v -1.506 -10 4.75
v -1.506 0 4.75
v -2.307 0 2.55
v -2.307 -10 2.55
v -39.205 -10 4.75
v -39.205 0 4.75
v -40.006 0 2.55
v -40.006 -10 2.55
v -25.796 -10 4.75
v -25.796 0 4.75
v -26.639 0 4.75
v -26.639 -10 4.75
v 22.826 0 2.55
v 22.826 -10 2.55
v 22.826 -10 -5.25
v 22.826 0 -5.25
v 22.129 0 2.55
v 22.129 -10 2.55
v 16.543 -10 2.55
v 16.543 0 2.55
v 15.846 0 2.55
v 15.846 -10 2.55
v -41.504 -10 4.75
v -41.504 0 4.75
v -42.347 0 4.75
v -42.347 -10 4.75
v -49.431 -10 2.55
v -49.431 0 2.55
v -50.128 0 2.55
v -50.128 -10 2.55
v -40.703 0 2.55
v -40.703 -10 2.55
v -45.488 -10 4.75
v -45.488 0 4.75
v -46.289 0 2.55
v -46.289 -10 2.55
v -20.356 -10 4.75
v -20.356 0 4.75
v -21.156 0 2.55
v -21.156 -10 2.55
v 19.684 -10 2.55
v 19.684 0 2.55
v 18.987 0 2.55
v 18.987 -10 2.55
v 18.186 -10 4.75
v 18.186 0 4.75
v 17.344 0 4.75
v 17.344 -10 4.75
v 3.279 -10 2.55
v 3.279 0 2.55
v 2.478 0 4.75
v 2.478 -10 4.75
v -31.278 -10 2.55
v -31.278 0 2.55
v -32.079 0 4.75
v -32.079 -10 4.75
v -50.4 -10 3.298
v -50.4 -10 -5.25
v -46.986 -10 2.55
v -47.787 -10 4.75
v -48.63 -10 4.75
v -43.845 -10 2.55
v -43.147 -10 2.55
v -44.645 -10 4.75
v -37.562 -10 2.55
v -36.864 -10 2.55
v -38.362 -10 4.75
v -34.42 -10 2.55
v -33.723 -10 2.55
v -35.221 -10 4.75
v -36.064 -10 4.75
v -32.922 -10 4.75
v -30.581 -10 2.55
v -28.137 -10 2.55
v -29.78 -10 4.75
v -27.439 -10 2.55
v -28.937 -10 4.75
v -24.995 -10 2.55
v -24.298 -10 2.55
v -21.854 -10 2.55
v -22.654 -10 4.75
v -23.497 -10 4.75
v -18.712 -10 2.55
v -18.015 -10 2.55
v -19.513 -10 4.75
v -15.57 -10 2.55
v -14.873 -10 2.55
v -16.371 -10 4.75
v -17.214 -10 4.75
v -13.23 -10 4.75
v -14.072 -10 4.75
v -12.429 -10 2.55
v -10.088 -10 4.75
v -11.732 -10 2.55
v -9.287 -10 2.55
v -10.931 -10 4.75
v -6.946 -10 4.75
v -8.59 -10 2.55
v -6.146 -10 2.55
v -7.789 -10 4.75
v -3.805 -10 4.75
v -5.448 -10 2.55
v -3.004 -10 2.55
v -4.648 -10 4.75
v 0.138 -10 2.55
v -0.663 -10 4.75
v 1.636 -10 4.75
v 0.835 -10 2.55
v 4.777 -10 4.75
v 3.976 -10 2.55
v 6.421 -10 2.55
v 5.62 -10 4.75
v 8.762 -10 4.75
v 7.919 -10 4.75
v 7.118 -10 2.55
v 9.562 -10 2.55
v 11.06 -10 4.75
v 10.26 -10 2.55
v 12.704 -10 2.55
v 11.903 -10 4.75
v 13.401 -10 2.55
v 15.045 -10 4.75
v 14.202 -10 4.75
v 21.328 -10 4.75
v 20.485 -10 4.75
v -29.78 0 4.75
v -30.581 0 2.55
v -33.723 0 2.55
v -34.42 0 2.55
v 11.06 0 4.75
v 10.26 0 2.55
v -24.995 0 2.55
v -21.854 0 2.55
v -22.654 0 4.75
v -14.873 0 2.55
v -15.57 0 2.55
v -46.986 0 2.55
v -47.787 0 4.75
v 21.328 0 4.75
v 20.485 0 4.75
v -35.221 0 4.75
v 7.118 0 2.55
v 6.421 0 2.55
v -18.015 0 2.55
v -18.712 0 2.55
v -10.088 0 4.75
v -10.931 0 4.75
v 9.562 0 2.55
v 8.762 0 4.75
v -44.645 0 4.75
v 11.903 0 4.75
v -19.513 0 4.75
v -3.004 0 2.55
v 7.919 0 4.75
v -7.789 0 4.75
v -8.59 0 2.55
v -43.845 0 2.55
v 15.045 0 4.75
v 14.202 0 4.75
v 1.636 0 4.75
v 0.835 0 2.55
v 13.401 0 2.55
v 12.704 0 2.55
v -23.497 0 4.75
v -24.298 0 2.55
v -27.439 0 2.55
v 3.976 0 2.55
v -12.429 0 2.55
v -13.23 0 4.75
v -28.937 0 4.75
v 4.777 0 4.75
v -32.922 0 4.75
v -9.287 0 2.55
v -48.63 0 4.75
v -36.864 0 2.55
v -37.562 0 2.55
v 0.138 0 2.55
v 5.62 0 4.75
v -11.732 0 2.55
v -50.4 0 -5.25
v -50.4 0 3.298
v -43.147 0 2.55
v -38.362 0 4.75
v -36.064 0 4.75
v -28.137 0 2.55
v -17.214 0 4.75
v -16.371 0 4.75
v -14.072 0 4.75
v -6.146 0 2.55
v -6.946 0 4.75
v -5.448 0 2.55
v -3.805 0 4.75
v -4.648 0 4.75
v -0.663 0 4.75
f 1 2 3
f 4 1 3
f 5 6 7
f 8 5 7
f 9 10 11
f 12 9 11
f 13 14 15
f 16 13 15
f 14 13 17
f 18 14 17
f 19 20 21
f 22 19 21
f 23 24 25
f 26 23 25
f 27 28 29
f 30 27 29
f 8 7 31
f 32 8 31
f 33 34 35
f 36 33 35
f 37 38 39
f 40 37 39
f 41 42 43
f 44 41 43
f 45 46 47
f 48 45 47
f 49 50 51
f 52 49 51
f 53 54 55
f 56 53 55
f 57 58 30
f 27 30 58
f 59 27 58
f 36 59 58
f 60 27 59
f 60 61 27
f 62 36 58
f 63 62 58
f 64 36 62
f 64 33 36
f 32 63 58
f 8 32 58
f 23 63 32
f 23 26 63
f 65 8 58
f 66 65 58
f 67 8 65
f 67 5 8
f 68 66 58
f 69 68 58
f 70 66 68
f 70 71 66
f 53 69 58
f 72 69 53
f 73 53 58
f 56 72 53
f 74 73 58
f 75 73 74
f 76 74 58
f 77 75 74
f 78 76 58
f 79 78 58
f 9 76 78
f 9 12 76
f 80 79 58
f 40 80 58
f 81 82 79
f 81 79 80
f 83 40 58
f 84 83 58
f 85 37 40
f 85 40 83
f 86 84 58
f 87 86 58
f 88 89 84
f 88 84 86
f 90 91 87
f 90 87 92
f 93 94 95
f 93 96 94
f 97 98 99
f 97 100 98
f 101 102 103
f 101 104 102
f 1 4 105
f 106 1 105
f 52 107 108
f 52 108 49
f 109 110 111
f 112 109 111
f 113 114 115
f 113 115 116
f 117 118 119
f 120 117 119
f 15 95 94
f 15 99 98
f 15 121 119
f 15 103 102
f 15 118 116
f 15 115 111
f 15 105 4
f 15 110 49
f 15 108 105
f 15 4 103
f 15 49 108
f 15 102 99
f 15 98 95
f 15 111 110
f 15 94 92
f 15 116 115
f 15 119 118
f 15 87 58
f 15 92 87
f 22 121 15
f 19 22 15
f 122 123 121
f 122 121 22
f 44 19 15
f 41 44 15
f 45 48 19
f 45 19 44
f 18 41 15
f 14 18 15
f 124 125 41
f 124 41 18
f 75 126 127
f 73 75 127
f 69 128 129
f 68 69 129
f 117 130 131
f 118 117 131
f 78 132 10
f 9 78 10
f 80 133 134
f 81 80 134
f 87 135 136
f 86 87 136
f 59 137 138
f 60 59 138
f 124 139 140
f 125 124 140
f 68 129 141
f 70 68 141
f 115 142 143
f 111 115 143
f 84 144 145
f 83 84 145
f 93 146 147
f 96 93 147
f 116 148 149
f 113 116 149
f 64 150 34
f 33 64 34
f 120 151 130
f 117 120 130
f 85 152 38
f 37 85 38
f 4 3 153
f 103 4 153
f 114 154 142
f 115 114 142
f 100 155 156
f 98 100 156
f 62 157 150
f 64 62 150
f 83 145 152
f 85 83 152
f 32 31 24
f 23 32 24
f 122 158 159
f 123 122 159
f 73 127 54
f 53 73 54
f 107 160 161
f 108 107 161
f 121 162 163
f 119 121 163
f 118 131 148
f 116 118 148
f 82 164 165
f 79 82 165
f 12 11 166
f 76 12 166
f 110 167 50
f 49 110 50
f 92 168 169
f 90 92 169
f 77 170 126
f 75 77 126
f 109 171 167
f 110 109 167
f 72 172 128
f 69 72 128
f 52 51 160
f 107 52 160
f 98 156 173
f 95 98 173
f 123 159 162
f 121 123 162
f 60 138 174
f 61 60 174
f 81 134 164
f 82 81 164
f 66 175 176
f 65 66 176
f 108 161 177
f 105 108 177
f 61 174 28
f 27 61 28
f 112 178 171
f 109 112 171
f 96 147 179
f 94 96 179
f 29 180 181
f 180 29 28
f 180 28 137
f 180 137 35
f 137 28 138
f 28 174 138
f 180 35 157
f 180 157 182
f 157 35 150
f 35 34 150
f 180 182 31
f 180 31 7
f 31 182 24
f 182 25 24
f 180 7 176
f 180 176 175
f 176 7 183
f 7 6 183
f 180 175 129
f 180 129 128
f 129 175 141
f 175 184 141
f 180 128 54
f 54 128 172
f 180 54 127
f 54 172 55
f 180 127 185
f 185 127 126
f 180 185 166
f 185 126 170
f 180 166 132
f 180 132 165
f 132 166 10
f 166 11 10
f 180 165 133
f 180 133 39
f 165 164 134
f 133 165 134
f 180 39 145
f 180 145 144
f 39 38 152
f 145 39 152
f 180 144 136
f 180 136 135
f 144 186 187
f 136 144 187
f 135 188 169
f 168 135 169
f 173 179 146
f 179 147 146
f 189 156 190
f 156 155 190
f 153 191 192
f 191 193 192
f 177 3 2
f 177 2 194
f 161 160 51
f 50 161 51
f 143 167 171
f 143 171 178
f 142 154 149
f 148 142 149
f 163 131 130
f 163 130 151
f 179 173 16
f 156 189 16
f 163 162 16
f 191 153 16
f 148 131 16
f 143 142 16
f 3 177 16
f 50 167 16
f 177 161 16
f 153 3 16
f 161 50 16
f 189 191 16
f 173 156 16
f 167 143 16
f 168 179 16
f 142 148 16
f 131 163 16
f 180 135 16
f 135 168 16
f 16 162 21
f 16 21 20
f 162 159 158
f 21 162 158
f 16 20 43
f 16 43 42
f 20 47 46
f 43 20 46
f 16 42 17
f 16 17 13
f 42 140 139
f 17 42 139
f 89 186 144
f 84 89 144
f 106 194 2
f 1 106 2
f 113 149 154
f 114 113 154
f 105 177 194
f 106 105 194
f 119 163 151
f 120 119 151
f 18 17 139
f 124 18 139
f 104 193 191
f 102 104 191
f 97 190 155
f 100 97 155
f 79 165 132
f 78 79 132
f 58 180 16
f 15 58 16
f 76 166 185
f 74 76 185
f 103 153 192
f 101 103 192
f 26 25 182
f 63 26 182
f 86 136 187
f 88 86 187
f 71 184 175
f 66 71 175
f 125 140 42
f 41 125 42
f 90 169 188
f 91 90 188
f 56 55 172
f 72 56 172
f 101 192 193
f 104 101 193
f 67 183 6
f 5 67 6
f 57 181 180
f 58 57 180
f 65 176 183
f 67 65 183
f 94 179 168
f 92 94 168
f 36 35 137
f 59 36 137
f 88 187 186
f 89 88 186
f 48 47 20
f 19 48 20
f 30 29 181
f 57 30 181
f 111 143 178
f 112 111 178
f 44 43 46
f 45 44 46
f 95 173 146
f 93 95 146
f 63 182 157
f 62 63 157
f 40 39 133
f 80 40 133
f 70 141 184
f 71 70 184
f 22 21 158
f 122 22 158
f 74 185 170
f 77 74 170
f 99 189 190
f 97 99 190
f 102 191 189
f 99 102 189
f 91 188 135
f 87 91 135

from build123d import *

# Parameters (mm, degrees)
F1_DEPTH = 25
F3_DEPTH = 26
F5_DEPTH = 25
F6_DEPTH = 15


with BuildPart() as f1:
    # F0 (on Front) → F1 (new body)
    with BuildSketch(Plane.XZ):
        Polygon((245.77381, 2.55), (245.181582, 2.55), (244.380847, 4.75), (243.537993, 4.75), (242.737258, 2.55), (242.039992, 2.55), (241.239257, 4.75), (240.396403, 4.75), (239.595668, 2.55), (238.898402, 2.55), (238.097667, 4.75), (237.254813, 4.75), (236.454078, 2.55), (235.756812, 2.55), (234.956077, 4.75), (234.113223, 4.75), (233.312488, 2.55), (232.615222, 2.55), (231.814487, 4.75), (230.971633, 4.75), (230.170898, 2.55), (229.473632, 2.55), (228.672897, 4.75), (227.830043, 4.75), (227.029308, 2.55), (226.332042, 2.55), (225.531307, 4.75), (224.688453, 4.75), (223.887718, 2.55), (223.190452, 2.55), (222.389717, 4.75), (221.546863, 4.75), (220.746128, 2.55), (220.048862, 2.55), (219.248127, 4.75), (218.405273, 4.75), (217.604538, 2.55), (216.907272, 2.55), (216.106537, 4.75), (215.263683, 4.75), (214.462948, 2.55), (213.765682, 2.55), (212.964947, 4.75), (212.122093, 4.75), (211.321358, 2.55), (210.624092, 2.55), (209.823357, 4.75), (208.980503, 4.75), (208.179768, 2.55), (207.482502, 2.55), (206.681767, 4.75), (205.838913, 4.75), (205.038178, 2.55), (204.340912, 2.55), (203.540177, 4.75), (202.697323, 4.75), (201.896588, 2.55), (201.199322, 2.55), (200.398587, 4.75), (199.555733, 4.75), (198.754998, 2.55), (198.057732, 2.55), (197.256997, 4.75), (196.414143, 4.75), (195.613408, 2.55), (194.916142, 2.55), (194.115407, 4.75), (193.272553, 4.75), (192.471818, 2.55), (191.774552, 2.55), (190.973817, 4.75), (190.130963, 4.75), (189.330228, 2.55), (188.632962, 2.55), (187.832227, 4.75), (186.989373, 4.75), (186.188638, 2.55), (185.491372, 2.55), (184.690637, 4.75), (183.847783, 4.75), (183.047048, 2.55), (182.349782, 2.55), (181.549047, 4.75), (180.706193, 4.75), (179.905458, 2.55), (179.208192, 2.55), (178.407457, 4.75), (177.564603, 4.75), (176.763868, 2.55), (176.066602, 2.55), (175.265867, 4.75), (174.423013, 4.75), (173.622278, 2.55), (172.925012, 2.55), (172.124277, 4.75), (171.281423, 4.75), (170.480688, 2.55), (169.783422, 2.55), (168.982687, 4.75), (168.139833, 4.75), (167.339098, 2.55), (166.641832, 2.55), (165.841097, 4.75), (164.998243, 4.75), (164.197508, 2.55), (163.500242, 2.55), (162.699507, 4.75), (161.856653, 4.75), (161.055918, 2.55), (160.358652, 2.55), (159.557917, 4.75), (158.715063, 4.75), (157.914328, 2.55), (157.217062, 2.55), (156.416327, 4.75), (155.573473, 4.75), (154.772738, 2.55), (154.075472, 2.55), (153.274737, 4.75), (152.431883, 4.75), (151.631148, 2.55), (150.933882, 2.55), (150.133147, 4.75), (149.290293, 4.75), (148.489558, 2.55), (147.792292, 2.55), (146.991557, 4.75), (146.148703, 4.75), (145.347968, 2.55), (144.650702, 2.55), (143.849967, 4.75), (143.007113, 4.75), (142.206378, 2.55), (141.509112, 2.55), (140.708377, 4.75), (139.865523, 4.75), (139.064788, 2.55), (138.367522, 2.55), (137.566787, 4.75), (136.723933, 4.75), (135.923198, 2.55), (135.225932, 2.55), (134.425197, 4.75), (133.582343, 4.75), (132.781608, 2.55), (132.084342, 2.55), (131.283607, 4.75), (130.440753, 4.75), (129.640018, 2.55), (128.942752, 2.55), (128.142017, 4.75), (127.299163, 4.75), (126.498428, 2.55), (125.801162, 2.55), (125.000427, 4.75), (124.157573, 4.75), (123.356838, 2.55), (122.659572, 2.55), (121.858837, 4.75), (121.015983, 4.75), (120.215248, 2.55), (119.517982, 2.55), (118.717247, 4.75), (117.874393, 4.75), (117.073658, 2.55), (116.376392, 2.55), (115.575657, 4.75), (114.732803, 4.75), (113.932068, 2.55), (113.234802, 2.55), (112.434067, 4.75), (111.591213, 4.75), (110.790478, 2.55), (110.093212, 2.55), (109.292477, 4.75), (108.449623, 4.75), (107.648888, 2.55), (106.951622, 2.55), (106.150887, 4.75), (105.308033, 4.75), (104.507298, 2.55), (103.810032, 2.55), (103.009297, 4.75), (102.166443, 4.75), (101.365708, 2.55), (100.668442, 2.55), (99.867707, 4.75), (99.024853, 4.75), (98.224118, 2.55), (97.526852, 2.55), (96.726117, 4.75), (95.883263, 4.75), (95.082528, 2.55), (94.385262, 2.55), (93.584527, 4.75), (92.741673, 4.75), (91.940938, 2.55), (91.243672, 2.55), (90.442937, 4.75), (89.600083, 4.75), (88.799348, 2.55), (88.102082, 2.55), (87.301347, 4.75), (86.458493, 4.75), (85.657758, 2.55), (84.960492, 2.55), (84.159757, 4.75), (83.316903, 4.75), (82.516168, 2.55), (81.818902, 2.55), (81.018167, 4.75), (80.175313, 4.75), (79.374578, 2.55), (78.677312, 2.55), (77.876577, 4.75), (77.033723, 4.75), (76.232988, 2.55), (75.535722, 2.55), (74.734987, 4.75), (73.892133, 4.75), (73.091398, 2.55), (72.394132, 2.55), (71.593397, 4.75), (70.750543, 4.75), (69.949808, 2.55), (69.252542, 2.55), (68.451807, 4.75), (67.608953, 4.75), (66.808218, 2.55), (66.110952, 2.55), (65.310217, 4.75), (64.467363, 4.75), (63.666628, 2.55), (62.969362, 2.55), (62.168627, 4.75), (61.325773, 4.75), (60.525038, 2.55), (59.827772, 2.55), (59.027037, 4.75), (58.184183, 4.75), (57.383448, 2.55), (56.686182, 2.55), (55.885447, 4.75), (55.042593, 4.75), (54.241858, 2.55), (53.544592, 2.55), (52.743857, 4.75), (51.901003, 4.75), (51.100268, 2.55), (50.403002, 2.55), (49.602267, 4.75), (48.759413, 4.75), (47.958678, 2.55), (47.261412, 2.55), (46.460677, 4.75), (45.617823, 4.75), (44.817088, 2.55), (44.7243452072, 2.55), (44.7243452072, -5.25), (245.77381, -5.25), align=None)
        Polygon((-50.4001379013, -5.25), (44.7243452072, -5.25), (44.7243452072, 2.55), (44.119822, 2.55), (43.319087, 4.75), (42.476233, 4.75), (41.675498, 2.55), (40.978232, 2.55), (40.177497, 4.75), (39.334643, 4.75), (38.533908, 2.55), (37.836642, 2.55), (37.035907, 4.75), (36.193053, 4.75), (35.392318, 2.55), (34.695052, 2.55), (33.894317, 4.75), (33.051463, 4.75), (32.250728, 2.55), (31.553462, 2.55), (30.752727, 4.75), (29.909873, 4.75), (29.109138, 2.55), (28.411872, 2.55), (27.611137, 4.75), (26.768283, 4.75), (25.967548, 2.55), (25.270282, 2.55), (24.469547, 4.75), (23.626693, 4.75), (22.825958, 2.55), (22.128692, 2.55), (21.327957, 4.75), (20.485103, 4.75), (19.684368, 2.55), (18.987102, 2.55), (18.186367, 4.75), (17.343513, 4.75), (16.542778, 2.55), (15.845512, 2.55), (15.044777, 4.75), (14.201923, 4.75), (13.401188, 2.55), (12.703922, 2.55), (11.903187, 4.75), (11.060333, 4.75), (10.259598, 2.55), (9.562332, 2.55), (8.761597, 4.75), (7.918743, 4.75), (7.118008, 2.55), (6.420742, 2.55), (5.620007, 4.75), (4.777153, 4.75), (3.976418, 2.55), (3.279152, 2.55), (2.478417, 4.75), (1.635563, 4.75), (0.834828, 2.55), (0.137562, 2.55), (-0.663173, 4.75), (-1.506027, 4.75), (-2.306762, 2.55), (-3.004028, 2.55), (-3.804763, 4.75), (-4.647617, 4.75), (-5.448352, 2.55), (-6.145618, 2.55), (-6.946353, 4.75), (-7.789207, 4.75), (-8.589942, 2.55), (-9.287208, 2.55), (-10.087943, 4.75), (-10.930797, 4.75), (-11.731532, 2.55), (-12.428798, 2.55), (-13.229533, 4.75), (-14.072387, 4.75), (-14.873122, 2.55), (-15.570388, 2.55), (-16.371123, 4.75), (-17.213977, 4.75), (-18.014712, 2.55), (-18.711978, 2.55), (-19.512713, 4.75), (-20.355567, 4.75), (-21.156302, 2.55), (-21.853568, 2.55), (-22.654303, 4.75), (-23.497157, 4.75), (-24.297892, 2.55), (-24.995158, 2.55), (-25.795893, 4.75), (-26.638747, 4.75), (-27.439482, 2.55), (-28.136748, 2.55), (-28.937483, 4.75), (-29.780337, 4.75), (-30.581072, 2.55), (-31.278338, 2.55), (-32.079073, 4.75), (-32.921927, 4.75), (-33.722662, 2.55), (-34.419928, 2.55), (-35.220663, 4.75), (-36.063517, 4.75), (-36.864252, 2.55), (-37.561518, 2.55), (-38.362253, 4.75), (-39.205107, 4.75), (-40.005842, 2.55), (-40.703108, 2.55), (-41.503843, 4.75), (-42.346697, 4.75), (-43.147432, 2.55), (-43.844698, 2.55), (-44.645433, 4.75), (-45.488287, 4.75), (-46.289022, 2.55), (-46.986288, 2.55), (-47.787023, 4.75), (-48.629877, 4.75), (-49.430612, 2.55), (-50.127878, 2.55), (-50.4001379013, 3.2980274783), align=None)
    extrude(amount=F1_DEPTH)

    # F2 (on face) → F3 (cut)
    with BuildSketch(Plane.XZ.offset(25)):
        Polygon((111.591213, 4.75), (110.790478, 2.55), (110.790478, -5.25), (245.77381, -5.25), (245.77381, 2.55), (245.181582, 2.55), (244.380847, 4.75), (243.537993, 4.75), (242.737258, 2.55), (242.039992, 2.55), (241.239257, 4.75), (240.396403, 4.75), (239.595668, 2.55), (238.898402, 2.55), (238.097667, 4.75), (237.254813, 4.75), (236.454078, 2.55), (235.756812, 2.55), (234.956077, 4.75), (234.113223, 4.75), (233.312488, 2.55), (232.615222, 2.55), (231.814487, 4.75), (230.971633, 4.75), (230.170898, 2.55), (229.473632, 2.55), (228.672897, 4.75), (227.830043, 4.75), (227.029308, 2.55), (226.332042, 2.55), (225.531307, 4.75), (224.688453, 4.75), (223.887718, 2.55), (223.190452, 2.55), (222.389717, 4.75), (221.546863, 4.75), (220.746128, 2.55), (220.048862, 2.55), (219.248127, 4.75), (218.405273, 4.75), (217.604538, 2.55), (216.907272, 2.55), (216.106537, 4.75), (215.263683, 4.75), (214.462948, 2.55), (213.765682, 2.55), (212.964947, 4.75), (212.122093, 4.75), (211.321358, 2.55), (210.624092, 2.55), (209.823357, 4.75), (208.980503, 4.75), (208.179768, 2.55), (207.482502, 2.55), (206.681767, 4.75), (205.838913, 4.75), (205.038178, 2.55), (204.340912, 2.55), (203.540177, 4.75), (202.697323, 4.75), (201.896588, 2.55), (201.199322, 2.55), (200.398587, 4.75), (199.555733, 4.75), (198.754998, 2.55), (198.057732, 2.55), (197.256997, 4.75), (196.414143, 4.75), (195.613408, 2.55), (194.916142, 2.55), (194.115407, 4.75), (193.272553, 4.75), (192.471818, 2.55), (191.774552, 2.55), (190.973817, 4.75), (190.130963, 4.75), (189.330228, 2.55), (188.632962, 2.55), (187.832227, 4.75), (186.989373, 4.75), (186.188638, 2.55), (185.491372, 2.55), (184.690637, 4.75), (183.847783, 4.75), (183.047048, 2.55), (182.349782, 2.55), (181.549047, 4.75), (180.706193, 4.75), (179.905458, 2.55), (179.208192, 2.55), (178.407457, 4.75), (177.564603, 4.75), (176.763868, 2.55), (176.066602, 2.55), (175.265867, 4.75), (174.423013, 4.75), (173.622278, 2.55), (172.925012, 2.55), (172.124277, 4.75), (171.281423, 4.75), (170.480688, 2.55), (169.783422, 2.55), (168.982687, 4.75), (168.139833, 4.75), (167.339098, 2.55), (166.641832, 2.55), (165.841097, 4.75), (164.998243, 4.75), (164.197508, 2.55), (163.500242, 2.55), (162.699507, 4.75), (161.856653, 4.75), (161.055918, 2.55), (160.358652, 2.55), (159.557917, 4.75), (158.715063, 4.75), (157.914328, 2.55), (157.217062, 2.55), (156.416327, 4.75), (155.573473, 4.75), (154.772738, 2.55), (154.075472, 2.55), (153.274737, 4.75), (152.431883, 4.75), (151.631148, 2.55), (150.933882, 2.55), (150.133147, 4.75), (149.290293, 4.75), (148.489558, 2.55), (147.792292, 2.55), (146.991557, 4.75), (146.148703, 4.75), (145.347968, 2.55), (144.650702, 2.55), (143.849967, 4.75), (143.007113, 4.75), (142.206378, 2.55), (141.509112, 2.55), (140.708377, 4.75), (139.865523, 4.75), (139.064788, 2.55), (138.367522, 2.55), (137.566787, 4.75), (136.723933, 4.75), (135.923198, 2.55), (135.225932, 2.55), (134.425197, 4.75), (133.582343, 4.75), (132.781608, 2.55), (132.084342, 2.55), (131.283607, 4.75), (130.440753, 4.75), (129.640018, 2.55), (128.942752, 2.55), (128.142017, 4.75), (127.299163, 4.75), (126.498428, 2.55), (125.801162, 2.55), (125.000427, 4.75), (124.157573, 4.75), (123.356838, 2.55), (122.659572, 2.55), (121.858837, 4.75), (121.015983, 4.75), (120.215248, 2.55), (119.517982, 2.55), (118.717247, 4.75), (117.874393, 4.75), (117.073658, 2.55), (116.376392, 2.55), (115.575657, 4.75), (114.732803, 4.75), (113.932068, 2.55), (113.234802, 2.55), (112.434067, 4.75), align=None)
    extrude(amount=-F3_DEPTH, mode=Mode.SUBTRACT)

    # F4 (on face) → F5 (cut)
    with BuildSketch(Plane.XZ.offset(25)):
        Polygon((23.626693, 4.75), (22.825958, 2.55), (22.825958, -5.25), (110.790478, -5.25), (110.790478, 2.55), (110.093212, 2.55), (109.292477, 4.75), (108.449623, 4.75), (107.648888, 2.55), (106.951622, 2.55), (106.150887, 4.75), (105.308033, 4.75), (104.507298, 2.55), (103.810032, 2.55), (103.009297, 4.75), (102.166443, 4.75), (101.365708, 2.55), (100.668442, 2.55), (99.867707, 4.75), (99.024853, 4.75), (98.224118, 2.55), (97.526852, 2.55), (96.726117, 4.75), (95.883263, 4.75), (95.082528, 2.55), (94.385262, 2.55), (93.584527, 4.75), (92.741673, 4.75), (91.940938, 2.55), (91.243672, 2.55), (90.442937, 4.75), (89.600083, 4.75), (88.799348, 2.55), (88.102082, 2.55), (87.301347, 4.75), (86.458493, 4.75), (85.657758, 2.55), (84.960492, 2.55), (84.159757, 4.75), (83.316903, 4.75), (82.516168, 2.55), (81.818902, 2.55), (81.018167, 4.75), (80.175313, 4.75), (79.374578, 2.55), (78.677312, 2.55), (77.876577, 4.75), (77.033723, 4.75), (76.232988, 2.55), (75.535722, 2.55), (74.734987, 4.75), (73.892133, 4.75), (73.091398, 2.55), (72.394132, 2.55), (71.593397, 4.75), (70.750543, 4.75), (69.949808, 2.55), (69.252542, 2.55), (68.451807, 4.75), (67.608953, 4.75), (66.808218, 2.55), (66.110952, 2.55), (65.310217, 4.75), (64.467363, 4.75), (63.666628, 2.55), (62.969362, 2.55), (62.168627, 4.75), (61.325773, 4.75), (60.525038, 2.55), (59.827772, 2.55), (59.027037, 4.75), (58.184183, 4.75), (57.383448, 2.55), (56.686182, 2.55), (55.885447, 4.75), (55.042593, 4.75), (54.241858, 2.55), (53.544592, 2.55), (52.743857, 4.75), (51.901003, 4.75), (51.100268, 2.55), (50.403002, 2.55), (49.602267, 4.75), (48.759413, 4.75), (47.958678, 2.55), (47.261412, 2.55), (46.460677, 4.75), (45.617823, 4.75), (44.817088, 2.55), (44.119822, 2.55), (43.319087, 4.75), (42.476233, 4.75), (41.675498, 2.55), (40.978232, 2.55), (40.177497, 4.75), (39.334643, 4.75), (38.533908, 2.55), (37.836642, 2.55), (37.035907, 4.75), (36.193053, 4.75), (35.392318, 2.55), (34.695052, 2.55), (33.894317, 4.75), (33.051463, 4.75), (32.250728, 2.55), (31.553462, 2.55), (30.752727, 4.75), (29.909873, 4.75), (29.109138, 2.55), (28.411872, 2.55), (27.611137, 4.75), (26.768283, 4.75), (25.967548, 2.55), (25.270282, 2.55), (24.469547, 4.75), align=None)
    extrude(amount=-F5_DEPTH, mode=Mode.SUBTRACT)

    # F6 (cut): a face of the model
    f6_faces = [f1.faces().sort_by_distance(p)[0] for p in [
        (-13.7754732897, -25, -0.7366515357),
    ]]
    extrude(f6_faces, amount=-F6_DEPTH, mode=Mode.SUBTRACT)


solid = f1.part
